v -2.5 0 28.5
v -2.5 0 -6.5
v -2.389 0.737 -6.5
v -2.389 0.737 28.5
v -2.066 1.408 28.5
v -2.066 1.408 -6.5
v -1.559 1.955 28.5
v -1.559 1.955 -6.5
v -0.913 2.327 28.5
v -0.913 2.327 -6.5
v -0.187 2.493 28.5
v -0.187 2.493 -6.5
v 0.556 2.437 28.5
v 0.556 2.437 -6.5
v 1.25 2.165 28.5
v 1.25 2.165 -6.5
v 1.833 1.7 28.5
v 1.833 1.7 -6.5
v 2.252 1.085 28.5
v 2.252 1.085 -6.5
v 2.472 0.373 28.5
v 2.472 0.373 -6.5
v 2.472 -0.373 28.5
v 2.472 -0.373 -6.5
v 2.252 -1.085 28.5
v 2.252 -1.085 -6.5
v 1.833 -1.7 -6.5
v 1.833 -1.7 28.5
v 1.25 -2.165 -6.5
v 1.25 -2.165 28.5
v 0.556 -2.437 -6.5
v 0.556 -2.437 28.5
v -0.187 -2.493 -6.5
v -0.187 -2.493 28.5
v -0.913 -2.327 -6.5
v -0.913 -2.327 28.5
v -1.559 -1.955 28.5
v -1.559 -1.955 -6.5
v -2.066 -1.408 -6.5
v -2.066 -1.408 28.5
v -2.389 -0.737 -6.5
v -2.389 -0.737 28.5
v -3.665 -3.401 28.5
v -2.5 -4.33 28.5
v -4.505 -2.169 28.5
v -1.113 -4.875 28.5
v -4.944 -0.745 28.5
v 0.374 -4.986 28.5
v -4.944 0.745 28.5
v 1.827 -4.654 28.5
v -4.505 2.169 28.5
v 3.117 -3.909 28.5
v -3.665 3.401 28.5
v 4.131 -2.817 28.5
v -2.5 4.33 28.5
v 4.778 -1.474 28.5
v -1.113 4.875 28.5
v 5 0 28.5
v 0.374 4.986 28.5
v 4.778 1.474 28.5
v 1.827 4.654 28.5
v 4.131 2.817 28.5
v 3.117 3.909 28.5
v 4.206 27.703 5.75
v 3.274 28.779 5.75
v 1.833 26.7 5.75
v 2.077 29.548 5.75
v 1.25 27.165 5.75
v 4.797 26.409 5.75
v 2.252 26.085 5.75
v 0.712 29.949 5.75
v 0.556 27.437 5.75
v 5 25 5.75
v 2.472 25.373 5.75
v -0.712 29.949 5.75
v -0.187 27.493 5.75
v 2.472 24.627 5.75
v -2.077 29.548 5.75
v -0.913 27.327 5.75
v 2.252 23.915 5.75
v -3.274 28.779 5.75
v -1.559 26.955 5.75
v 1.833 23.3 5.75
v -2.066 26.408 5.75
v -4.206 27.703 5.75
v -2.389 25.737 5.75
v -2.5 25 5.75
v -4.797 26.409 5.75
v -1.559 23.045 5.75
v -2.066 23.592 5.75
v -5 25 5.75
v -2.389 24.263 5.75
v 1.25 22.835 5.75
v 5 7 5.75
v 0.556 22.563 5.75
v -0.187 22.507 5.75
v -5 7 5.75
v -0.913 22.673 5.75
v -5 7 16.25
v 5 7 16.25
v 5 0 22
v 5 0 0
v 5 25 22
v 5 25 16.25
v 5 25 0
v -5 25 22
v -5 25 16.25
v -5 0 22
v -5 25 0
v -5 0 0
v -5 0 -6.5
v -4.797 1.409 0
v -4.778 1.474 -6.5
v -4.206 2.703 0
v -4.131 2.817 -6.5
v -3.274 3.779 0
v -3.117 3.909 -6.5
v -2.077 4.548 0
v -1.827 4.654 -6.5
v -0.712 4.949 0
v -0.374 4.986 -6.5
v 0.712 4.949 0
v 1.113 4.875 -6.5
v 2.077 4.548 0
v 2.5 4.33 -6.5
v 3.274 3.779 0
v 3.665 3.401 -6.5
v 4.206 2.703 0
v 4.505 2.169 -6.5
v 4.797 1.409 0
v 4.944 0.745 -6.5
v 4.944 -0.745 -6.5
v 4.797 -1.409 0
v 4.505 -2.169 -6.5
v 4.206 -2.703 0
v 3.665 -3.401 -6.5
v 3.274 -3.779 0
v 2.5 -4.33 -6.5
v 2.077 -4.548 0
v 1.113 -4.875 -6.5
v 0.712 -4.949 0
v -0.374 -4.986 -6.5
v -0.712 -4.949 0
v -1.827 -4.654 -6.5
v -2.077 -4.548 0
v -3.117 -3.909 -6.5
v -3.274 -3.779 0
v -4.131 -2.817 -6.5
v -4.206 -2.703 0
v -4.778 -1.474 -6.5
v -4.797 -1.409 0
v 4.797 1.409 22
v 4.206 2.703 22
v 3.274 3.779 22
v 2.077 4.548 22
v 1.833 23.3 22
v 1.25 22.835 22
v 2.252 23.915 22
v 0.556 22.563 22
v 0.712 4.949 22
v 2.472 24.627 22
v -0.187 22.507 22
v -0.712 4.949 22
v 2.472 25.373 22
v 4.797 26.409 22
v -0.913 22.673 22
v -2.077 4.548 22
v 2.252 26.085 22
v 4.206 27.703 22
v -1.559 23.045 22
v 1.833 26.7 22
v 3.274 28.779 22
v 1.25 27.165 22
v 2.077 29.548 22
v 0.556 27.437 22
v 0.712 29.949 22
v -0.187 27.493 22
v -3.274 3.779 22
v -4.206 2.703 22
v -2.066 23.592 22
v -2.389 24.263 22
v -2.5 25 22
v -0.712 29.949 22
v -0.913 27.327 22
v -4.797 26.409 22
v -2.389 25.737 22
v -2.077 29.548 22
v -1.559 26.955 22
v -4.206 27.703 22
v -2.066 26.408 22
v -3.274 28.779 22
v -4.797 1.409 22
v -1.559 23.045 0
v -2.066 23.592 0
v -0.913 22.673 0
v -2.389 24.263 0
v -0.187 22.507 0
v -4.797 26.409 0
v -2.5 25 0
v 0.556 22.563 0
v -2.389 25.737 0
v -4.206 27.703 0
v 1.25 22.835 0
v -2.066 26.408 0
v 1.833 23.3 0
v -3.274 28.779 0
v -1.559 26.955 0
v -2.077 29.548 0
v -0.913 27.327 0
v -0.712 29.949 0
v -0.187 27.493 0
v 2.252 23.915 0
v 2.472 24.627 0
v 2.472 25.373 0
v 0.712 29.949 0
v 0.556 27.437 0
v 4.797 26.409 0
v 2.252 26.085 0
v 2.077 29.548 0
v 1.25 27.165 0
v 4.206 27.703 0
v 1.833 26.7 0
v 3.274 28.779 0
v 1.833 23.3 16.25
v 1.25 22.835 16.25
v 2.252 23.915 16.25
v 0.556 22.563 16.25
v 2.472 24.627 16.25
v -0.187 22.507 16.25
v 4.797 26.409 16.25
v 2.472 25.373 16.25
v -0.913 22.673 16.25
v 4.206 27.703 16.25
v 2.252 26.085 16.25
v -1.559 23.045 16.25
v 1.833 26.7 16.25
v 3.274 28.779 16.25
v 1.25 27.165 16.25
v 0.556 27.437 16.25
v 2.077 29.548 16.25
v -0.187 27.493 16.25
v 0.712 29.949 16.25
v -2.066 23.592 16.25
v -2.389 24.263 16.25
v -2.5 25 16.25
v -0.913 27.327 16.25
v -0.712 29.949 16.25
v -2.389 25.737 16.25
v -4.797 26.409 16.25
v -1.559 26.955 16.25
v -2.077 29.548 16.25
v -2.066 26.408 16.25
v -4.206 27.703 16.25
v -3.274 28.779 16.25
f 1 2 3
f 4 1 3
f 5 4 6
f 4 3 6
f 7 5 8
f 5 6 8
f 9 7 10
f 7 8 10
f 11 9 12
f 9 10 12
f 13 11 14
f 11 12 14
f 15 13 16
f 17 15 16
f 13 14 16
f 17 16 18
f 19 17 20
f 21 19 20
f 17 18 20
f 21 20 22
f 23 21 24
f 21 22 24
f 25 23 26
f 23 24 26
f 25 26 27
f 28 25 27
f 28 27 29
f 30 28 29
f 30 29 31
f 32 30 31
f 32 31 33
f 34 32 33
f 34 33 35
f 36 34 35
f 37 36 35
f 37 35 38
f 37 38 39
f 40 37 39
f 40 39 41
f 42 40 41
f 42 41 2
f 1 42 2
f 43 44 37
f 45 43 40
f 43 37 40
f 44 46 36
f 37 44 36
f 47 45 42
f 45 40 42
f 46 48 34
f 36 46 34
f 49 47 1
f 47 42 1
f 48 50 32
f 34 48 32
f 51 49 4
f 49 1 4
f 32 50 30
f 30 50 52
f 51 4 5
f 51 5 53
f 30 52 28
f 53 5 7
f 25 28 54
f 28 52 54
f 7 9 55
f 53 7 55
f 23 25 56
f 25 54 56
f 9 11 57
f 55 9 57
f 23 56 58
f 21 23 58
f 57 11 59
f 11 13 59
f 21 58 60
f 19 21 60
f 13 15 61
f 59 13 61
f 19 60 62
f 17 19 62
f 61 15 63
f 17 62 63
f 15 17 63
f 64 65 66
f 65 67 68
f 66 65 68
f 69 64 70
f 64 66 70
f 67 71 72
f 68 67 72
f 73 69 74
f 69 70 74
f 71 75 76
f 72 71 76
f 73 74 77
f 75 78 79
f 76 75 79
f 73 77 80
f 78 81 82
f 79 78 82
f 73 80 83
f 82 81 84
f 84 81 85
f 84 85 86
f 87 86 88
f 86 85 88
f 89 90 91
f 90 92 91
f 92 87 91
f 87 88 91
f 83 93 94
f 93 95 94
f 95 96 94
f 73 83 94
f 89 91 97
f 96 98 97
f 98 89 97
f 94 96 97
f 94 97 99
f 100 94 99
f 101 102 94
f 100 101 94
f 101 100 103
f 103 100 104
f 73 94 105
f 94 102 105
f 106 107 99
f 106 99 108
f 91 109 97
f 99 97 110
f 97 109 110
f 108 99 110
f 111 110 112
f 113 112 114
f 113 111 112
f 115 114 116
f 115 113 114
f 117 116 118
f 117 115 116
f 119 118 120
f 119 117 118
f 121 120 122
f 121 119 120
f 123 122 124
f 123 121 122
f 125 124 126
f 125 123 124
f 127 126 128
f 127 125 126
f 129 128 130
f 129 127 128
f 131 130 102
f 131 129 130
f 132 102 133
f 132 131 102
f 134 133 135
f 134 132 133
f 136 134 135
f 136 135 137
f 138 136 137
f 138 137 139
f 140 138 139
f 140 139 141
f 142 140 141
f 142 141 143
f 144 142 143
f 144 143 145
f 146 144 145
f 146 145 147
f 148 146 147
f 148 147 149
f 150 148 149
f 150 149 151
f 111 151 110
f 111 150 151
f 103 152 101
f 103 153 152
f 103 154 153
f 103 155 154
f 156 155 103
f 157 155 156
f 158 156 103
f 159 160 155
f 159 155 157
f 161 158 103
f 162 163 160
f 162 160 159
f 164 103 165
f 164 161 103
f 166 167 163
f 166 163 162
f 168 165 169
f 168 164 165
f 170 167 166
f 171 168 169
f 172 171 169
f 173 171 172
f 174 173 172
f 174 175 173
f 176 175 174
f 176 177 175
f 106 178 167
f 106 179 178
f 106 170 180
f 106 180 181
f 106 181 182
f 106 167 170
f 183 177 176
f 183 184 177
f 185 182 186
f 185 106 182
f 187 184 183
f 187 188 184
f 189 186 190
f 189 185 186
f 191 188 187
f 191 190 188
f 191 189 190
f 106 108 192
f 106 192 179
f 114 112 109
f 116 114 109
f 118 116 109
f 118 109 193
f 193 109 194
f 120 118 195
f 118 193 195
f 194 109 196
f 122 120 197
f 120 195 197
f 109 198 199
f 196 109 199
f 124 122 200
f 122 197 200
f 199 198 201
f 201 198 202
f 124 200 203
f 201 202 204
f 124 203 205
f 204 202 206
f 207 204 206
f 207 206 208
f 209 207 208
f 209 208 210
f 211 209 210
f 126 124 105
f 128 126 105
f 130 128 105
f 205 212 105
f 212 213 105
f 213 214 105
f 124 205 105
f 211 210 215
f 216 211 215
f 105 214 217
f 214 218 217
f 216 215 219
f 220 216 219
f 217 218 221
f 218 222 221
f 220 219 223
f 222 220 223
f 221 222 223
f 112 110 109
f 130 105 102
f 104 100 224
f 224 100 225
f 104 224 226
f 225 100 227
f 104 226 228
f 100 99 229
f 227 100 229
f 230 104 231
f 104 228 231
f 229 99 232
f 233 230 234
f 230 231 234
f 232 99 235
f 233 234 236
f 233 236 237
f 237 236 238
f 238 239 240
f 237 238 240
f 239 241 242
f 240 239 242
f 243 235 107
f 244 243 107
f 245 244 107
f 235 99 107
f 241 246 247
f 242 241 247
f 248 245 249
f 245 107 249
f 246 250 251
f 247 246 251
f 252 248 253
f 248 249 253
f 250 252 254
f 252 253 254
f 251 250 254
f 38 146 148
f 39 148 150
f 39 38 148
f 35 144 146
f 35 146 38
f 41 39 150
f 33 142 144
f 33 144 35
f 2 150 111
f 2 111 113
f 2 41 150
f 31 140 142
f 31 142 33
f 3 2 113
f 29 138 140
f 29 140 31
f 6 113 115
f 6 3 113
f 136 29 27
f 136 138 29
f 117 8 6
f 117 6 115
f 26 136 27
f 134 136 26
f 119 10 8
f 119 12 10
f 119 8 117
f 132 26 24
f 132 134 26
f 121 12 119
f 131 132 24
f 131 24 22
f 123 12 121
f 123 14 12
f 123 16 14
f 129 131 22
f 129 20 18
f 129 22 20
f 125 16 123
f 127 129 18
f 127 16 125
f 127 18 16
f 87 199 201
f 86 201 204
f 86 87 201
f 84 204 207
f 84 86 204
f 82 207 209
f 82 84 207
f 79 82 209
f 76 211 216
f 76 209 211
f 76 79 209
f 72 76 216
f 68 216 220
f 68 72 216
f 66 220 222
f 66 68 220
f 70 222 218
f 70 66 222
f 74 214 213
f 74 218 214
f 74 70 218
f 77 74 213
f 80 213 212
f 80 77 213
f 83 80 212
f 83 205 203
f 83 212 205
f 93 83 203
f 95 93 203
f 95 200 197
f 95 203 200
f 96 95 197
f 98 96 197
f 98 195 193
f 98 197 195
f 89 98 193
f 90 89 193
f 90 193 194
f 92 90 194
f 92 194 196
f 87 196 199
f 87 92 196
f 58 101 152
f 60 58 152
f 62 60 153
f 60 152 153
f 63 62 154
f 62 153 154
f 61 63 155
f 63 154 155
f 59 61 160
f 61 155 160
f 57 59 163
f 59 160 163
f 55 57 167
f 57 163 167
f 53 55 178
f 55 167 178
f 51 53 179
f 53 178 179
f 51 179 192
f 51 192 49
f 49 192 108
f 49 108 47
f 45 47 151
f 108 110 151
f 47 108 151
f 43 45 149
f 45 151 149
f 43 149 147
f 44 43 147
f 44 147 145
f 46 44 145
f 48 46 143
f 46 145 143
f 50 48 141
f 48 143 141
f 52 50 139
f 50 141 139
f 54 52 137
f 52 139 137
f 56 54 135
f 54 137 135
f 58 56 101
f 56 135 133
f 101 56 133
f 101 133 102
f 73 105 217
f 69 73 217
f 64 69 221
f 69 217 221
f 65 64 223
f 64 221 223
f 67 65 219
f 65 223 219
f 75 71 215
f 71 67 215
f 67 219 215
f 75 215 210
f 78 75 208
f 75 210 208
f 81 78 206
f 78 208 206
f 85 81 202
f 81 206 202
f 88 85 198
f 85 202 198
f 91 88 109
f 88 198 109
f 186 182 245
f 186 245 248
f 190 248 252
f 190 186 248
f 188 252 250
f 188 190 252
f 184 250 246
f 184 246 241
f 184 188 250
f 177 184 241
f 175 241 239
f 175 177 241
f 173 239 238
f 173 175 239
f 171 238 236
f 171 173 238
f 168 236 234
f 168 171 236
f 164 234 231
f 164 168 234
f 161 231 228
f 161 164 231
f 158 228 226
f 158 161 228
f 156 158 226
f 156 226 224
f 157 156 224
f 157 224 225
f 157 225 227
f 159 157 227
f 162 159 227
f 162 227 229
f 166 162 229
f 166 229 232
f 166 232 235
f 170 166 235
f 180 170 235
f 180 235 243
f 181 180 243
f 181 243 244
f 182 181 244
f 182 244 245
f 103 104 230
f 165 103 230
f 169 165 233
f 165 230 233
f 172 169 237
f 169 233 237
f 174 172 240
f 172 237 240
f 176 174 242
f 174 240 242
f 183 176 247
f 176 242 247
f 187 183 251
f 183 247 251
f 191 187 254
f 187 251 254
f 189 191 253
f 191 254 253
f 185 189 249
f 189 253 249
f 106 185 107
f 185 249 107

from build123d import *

# Parameters (mm, degrees)
BOSS_EXTRUDE1_DEPTH = 5.75
SKETCH2_R           = 2.5
BOSS_EXTRUDE2_DEPTH = 10.5
BOSS_EXTRUDE3_DEPTH = 16.25
SKETCH4_R           = 5
SKETCH4_R_2         = 2.5
BOSS_EXTRUDE5_DEPTH = 8.5
SKETCH5_R           = 2.5
BOSS_EXTRUDE6_DEPTH = 16.25
BOSS_EXTRUDE7_START = 8.5
SKETCH6_R           = 5
BOSS_EXTRUDE7_DEPTH = 8.5
BOSS_EXTRUDE8_START = 8
SKETCH7_R           = 2.5
BOSS_EXTRUDE8_DEPTH = 8
SKETCH8_W           = 10.5
SKETCH8_H           = 5
CUT_EXTRUDE2_DEPTH  = 20
SKETCH9_R           = 2.5
BOSS_EXTRUDE9_DEPTH = 22
SKETCH10_R          = 2.5
CUT_EXTRUDE3_DEPTH  = 55
CUT_EXTRUDE4_START  = -22
CUT_EXTRUDE4_DEPTH  = 22
SKETCH12_W          = 1
SKETCH12_H          = 5
CUT_EXTRUDE5_DEPTH  = 10
SKETCH13_W          = 1
SKETCH13_H          = 10.672821352
SKETCH13_H_2        = 10
CUT_EXTRUDE7_DEPTH  = 10


with BuildPart() as part:
    # Sketch1 → Boss-Extrude1 (new body)
    with BuildSketch(Plane.XY):
        with BuildLine():
            ThreePointArc((-5, 0), (0, -5), (5, 0))
            Line((5, 0), (5, 25))
            ThreePointArc((5, 25), (0, 30), (-5, 25))
            Line((-5, 25), (-5, 0))
        make_face()
    extrude(amount=BOSS_EXTRUDE1_DEPTH)

    # Sketch2 → Boss-Extrude2 (add)
    with BuildSketch(Plane.XY.offset(5.75)):
        with Locations(Location((0, 25.008620985, 0), (0, 0, 180))):
            Circle(SKETCH2_R)
    extrude(amount=BOSS_EXTRUDE2_DEPTH)

    # Sketch3 → Boss-Extrude3 (add)
    with BuildSketch(Plane.XY.offset(5.75)):
        with BuildLine():
            Line((5, 0), (5, 25))
            ThreePointArc((5, 25), (0, 30), (-5, 25))
            Line((-5, 25), (-5, 0))
            ThreePointArc((-5, 0), (0, -5), (5, 0))
        make_face()
    extrude(amount=BOSS_EXTRUDE3_DEPTH)

    # Sketch4 → Boss-Extrude5 (add)
    with BuildSketch(Plane.XY.offset(22)):
        Circle(SKETCH4_R)
        Circle(SKETCH4_R_2, mode=Mode.SUBTRACT)
    extrude(amount=BOSS_EXTRUDE5_DEPTH)

    # Sketch5 → Boss-Extrude6 (add)
    with BuildSketch(Plane.XY.offset(22)):
        Circle(SKETCH5_R)
    extrude(amount=BOSS_EXTRUDE6_DEPTH)

    # Sketch6 → Boss-Extrude7 (add)
    with BuildSketch(Plane(origin=(0, 0, 0), x_dir=(-1, 0, 0), z_dir=(0, 0, -1)).offset(BOSS_EXTRUDE7_START)):
        Circle(SKETCH6_R)
    extrude(amount=-BOSS_EXTRUDE7_DEPTH)

    # Sketch7 → Boss-Extrude8 (add)
    with BuildSketch(Plane(origin=(0, 0, -8.5), x_dir=(-1, 0, 0), z_dir=(0, 0, -1)).offset(BOSS_EXTRUDE8_START)):
        with Locations(Location((0, 0, 0), (0, 0, 180))):
            Circle(SKETCH7_R)
    extrude(amount=-BOSS_EXTRUDE8_DEPTH)

    # Sketch8 → Cut-Extrude2 (cut)
    with BuildSketch(Plane.ZY.offset(5)):
        Polygon((16.25, 25), (5.75, 25), (5.75, 7.741676668), (5.75, 7), (16.25, 7), (16.25, 7.741676668), align=None)
        with Locations((11, 27.5)):
            Rectangle(SKETCH8_W, SKETCH8_H)
    extrude(amount=-CUT_EXTRUDE2_DEPTH, mode=Mode.SUBTRACT)

    # Sketch9 → Boss-Extrude9 (add)
    with BuildSketch(Plane.XY.offset(22)):
        with Locations(Location((0, 25, 0), (0, 0, 90))):
            Circle(SKETCH9_R)
    extrude(amount=-BOSS_EXTRUDE9_DEPTH)

    # Sketch10 → Cut-Extrude3 (cut)
    with BuildSketch(Plane(origin=(0, 0, -16.5), x_dir=(-1, 0, 0), z_dir=(0, 0, -1))):
        Circle(SKETCH10_R)
    extrude(amount=-CUT_EXTRUDE3_DEPTH, mode=Mode.SUBTRACT)

    # Sketch11 → Cut-Extrude4 (cut)
    with BuildSketch(Plane(origin=(0, 0, 0), x_dir=(-1, 0, 0), z_dir=(0, 0, -1)).offset(CUT_EXTRUDE4_START)):
        with BuildLine():
            ThreePointArc((-2.5, 25), (0, 22.5), (2.5, 25))
            Line((2.5, 25), (-2.5, 25))
        make_face()
        with BuildLine():
            Line((-2.5, 25), (2.5, 25))
            ThreePointArc((2.5, 25), (0, 27.5), (-2.5, 25))
        make_face()
    extrude(amount=CUT_EXTRUDE4_DEPTH, mode=Mode.SUBTRACT)

    # Sketch12 → Cut-Extrude5 (cut, symmetric)
    with BuildSketch(Plane(origin=(0, 0, 0), x_dir=(0, 0, -1), z_dir=(1, 0, 0))):
        with Locations((8, 2.5)):
            Rectangle(SKETCH12_W, SKETCH12_H)
        with Locations((8, -2.5)):
            Rectangle(SKETCH12_W, SKETCH12_H)
        with Locations((-30, 2.5)):
            Rectangle(SKETCH12_W, SKETCH12_H)
        with Locations((-30, -2.5)):
            Rectangle(SKETCH12_W, SKETCH12_H)
    extrude(amount=CUT_EXTRUDE5_DEPTH, both=True, mode=Mode.SUBTRACT)

    # Sketch13 → Cut-Extrude7 (cut)
    with BuildSketch(Plane(origin=(5, 0, 0), x_dir=(0, 0, -1), z_dir=(1, 0, 0))):
        with Locations((7, 0.336410676)):
            Rectangle(SKETCH13_W, SKETCH13_H)
        with Locations((-29, 0)):
            Rectangle(SKETCH13_W, SKETCH13_H_2)
    extrude(amount=-CUT_EXTRUDE7_DEPTH, mode=Mode.SUBTRACT)


solid = part.part
